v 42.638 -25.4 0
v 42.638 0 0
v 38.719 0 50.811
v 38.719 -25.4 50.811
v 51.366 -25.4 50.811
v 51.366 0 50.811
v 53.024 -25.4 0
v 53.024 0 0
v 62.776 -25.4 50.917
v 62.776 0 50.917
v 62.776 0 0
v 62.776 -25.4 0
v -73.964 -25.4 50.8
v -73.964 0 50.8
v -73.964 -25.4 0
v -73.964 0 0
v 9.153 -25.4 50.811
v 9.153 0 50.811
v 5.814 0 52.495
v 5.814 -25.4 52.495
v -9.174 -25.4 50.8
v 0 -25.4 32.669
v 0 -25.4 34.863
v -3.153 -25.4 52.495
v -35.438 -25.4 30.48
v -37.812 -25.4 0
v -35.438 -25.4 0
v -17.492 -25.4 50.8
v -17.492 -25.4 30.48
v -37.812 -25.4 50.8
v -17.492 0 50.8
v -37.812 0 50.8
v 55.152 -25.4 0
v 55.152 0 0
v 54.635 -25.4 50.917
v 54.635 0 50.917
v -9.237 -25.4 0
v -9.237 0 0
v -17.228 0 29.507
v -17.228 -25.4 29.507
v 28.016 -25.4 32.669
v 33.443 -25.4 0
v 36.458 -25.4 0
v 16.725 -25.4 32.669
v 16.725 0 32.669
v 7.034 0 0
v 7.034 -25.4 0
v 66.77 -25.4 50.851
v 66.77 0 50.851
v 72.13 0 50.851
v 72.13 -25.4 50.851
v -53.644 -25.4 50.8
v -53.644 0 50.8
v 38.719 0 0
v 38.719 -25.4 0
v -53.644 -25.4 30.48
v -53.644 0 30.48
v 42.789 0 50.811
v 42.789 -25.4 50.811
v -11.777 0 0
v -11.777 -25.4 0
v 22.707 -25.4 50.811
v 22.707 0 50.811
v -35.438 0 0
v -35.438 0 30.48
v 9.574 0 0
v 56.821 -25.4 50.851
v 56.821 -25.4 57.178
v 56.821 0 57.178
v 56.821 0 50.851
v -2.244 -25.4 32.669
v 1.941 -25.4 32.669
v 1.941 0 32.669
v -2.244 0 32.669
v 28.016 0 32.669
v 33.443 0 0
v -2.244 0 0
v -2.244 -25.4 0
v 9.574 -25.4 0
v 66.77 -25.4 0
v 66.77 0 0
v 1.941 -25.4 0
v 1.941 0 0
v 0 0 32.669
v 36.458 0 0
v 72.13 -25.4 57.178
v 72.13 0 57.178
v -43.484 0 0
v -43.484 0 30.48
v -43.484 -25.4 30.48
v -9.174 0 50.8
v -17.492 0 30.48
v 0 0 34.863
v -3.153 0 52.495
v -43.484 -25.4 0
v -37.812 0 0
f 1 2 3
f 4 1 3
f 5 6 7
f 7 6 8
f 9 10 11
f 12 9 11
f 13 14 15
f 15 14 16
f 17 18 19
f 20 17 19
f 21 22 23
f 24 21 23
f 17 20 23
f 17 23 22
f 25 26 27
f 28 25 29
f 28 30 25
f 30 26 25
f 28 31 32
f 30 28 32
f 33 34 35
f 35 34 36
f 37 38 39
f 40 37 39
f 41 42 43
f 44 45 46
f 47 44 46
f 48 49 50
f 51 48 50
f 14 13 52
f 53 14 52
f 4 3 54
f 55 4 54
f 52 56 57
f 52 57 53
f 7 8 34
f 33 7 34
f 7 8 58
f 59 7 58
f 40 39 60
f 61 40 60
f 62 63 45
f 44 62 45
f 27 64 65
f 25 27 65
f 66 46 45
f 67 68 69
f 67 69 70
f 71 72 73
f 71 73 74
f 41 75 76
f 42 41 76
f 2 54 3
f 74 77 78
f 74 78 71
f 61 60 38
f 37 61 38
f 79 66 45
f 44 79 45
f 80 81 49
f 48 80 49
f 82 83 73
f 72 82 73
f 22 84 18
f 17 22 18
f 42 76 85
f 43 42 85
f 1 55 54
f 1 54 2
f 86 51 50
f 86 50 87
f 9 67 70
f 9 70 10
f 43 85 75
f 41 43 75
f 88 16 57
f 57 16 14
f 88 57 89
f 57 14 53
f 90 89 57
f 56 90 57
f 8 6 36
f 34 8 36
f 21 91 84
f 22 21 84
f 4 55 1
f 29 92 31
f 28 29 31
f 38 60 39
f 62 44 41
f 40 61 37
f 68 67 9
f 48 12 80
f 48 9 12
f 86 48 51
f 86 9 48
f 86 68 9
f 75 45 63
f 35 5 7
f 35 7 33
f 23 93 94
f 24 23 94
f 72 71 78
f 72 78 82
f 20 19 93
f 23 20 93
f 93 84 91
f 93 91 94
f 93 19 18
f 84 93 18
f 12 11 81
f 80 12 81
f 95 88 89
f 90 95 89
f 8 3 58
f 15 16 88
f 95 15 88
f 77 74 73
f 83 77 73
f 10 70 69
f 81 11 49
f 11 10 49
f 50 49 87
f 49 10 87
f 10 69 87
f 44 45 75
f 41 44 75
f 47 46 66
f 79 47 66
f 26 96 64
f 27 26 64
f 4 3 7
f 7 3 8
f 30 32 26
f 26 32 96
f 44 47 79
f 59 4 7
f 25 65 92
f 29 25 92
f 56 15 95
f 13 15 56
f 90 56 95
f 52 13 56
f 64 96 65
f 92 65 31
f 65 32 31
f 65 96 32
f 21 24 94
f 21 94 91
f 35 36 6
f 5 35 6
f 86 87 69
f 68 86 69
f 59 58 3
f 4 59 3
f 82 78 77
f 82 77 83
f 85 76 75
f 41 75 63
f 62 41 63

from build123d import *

# Parameters (mm, degrees)
F0_W     = 20.32
F0_H     = 20.32
F1_DEPTH = 25.4
F0_W_2   = 2.3739616048
F0_H_2   = 30.48
F0_W_3   = 1.9410408568
F0_H_3   = 32.6687979088
F0_W_4   = 2.2444559727


with BuildPart() as f1:
    # F0 (on Front) → F1 (new body)
    with BuildSketch(Plane.XZ):
        Polygon((-73.9635265827, 30.48), (-73.9635265827, 0), (-43.4835265827, 0), (-43.4835265827, 30.48), (-53.6435265827, 30.48), align=None)
        with Locations((-63.8035265827, 40.64)):
            Rectangle(F0_W, F0_H)
    extrude(amount=F1_DEPTH)


with BuildPart() as f1b:
    # F0 (on Front) → F1, piece 2 (new body)
    with BuildSketch(Plane.XZ):
        Polygon((-17.4919143319, 50.8), (-37.8119143319, 50.8), (-37.8119143319, 30.48), (-35.4379527271, 30.48), (-17.4919143319, 30.48), align=None)
        with Locations((-36.6249335295, 15.24)):
            Rectangle(F0_W_2, F0_H_2)
    extrude(amount=F1_DEPTH)


with BuildPart() as f1c:
    # F0 (on Front) → F1, piece 3 (new body)
    with BuildSketch(Plane.XZ):
        Polygon((-9.2367352918, 0), (-17.2283914096, 29.5070133898), (-11.7767352918, 0), align=None)
    extrude(amount=F1_DEPTH)


with BuildPart() as f1d:
    # F0 (on Front) → F1, piece 4 (new body)
    with BuildSketch(Plane.XZ):
        Polygon((-3.1525824126, 52.4952739344), (-9.1739800919, 50.8), (0, 32.6687979088), (9.153141818, 50.8105286658), (5.8139392069, 52.4952739344), (0, 34.8632640513), align=None)
    extrude(amount=F1_DEPTH)


with BuildPart() as f1e:
    # F0 (on Front) → F1, piece 5 (new body)
    with BuildSketch(Plane.XZ):
        with Locations((0.9705204284, 16.3343989544)):
            Rectangle(F0_W_3, F0_H_3)
        with Locations((-1.1222279863, 16.3343989544)):
            Rectangle(F0_W_4, F0_H_3)
    extrude(amount=F1_DEPTH)


with BuildPart() as f1f:
    # F0 (on Front) → F1, piece 6 (new body)
    with BuildSketch(Plane.XZ):
        Polygon((28.0164722353, 32.6687979088), (22.7072164416, 50.8105286658), (16.7252030224, 32.6687979088), align=None)
    extrude(amount=F1_DEPTH)


with BuildPart() as f1g:
    # F0 (on Front) → F1, piece 7 (new body)
    with BuildSketch(Plane.XZ):
        Polygon((36.4577621222, 0), (28.0164722353, 32.6687979088), (33.4430150688, 0), align=None)
    extrude(amount=F1_DEPTH)


with BuildPart() as f1h:
    # F0 (on Front) → F1, piece 8 (new body)
    with BuildSketch(Plane.XZ):
        Polygon((9.5743408734, 0), (16.7252030224, 32.6687979088), (7.0343408734, 0), align=None)
    extrude(amount=F1_DEPTH)


with BuildPart() as f1i:
    # F0 (on Front) → F1, piece 9 (new body)
    with BuildSketch(Plane.XZ):
        Polygon((51.3659927748, 50.8105286658), (53.0241008602, 0), (55.1524981856, 0), (54.6348481797, 50.9172017455), align=None)
    extrude(amount=F1_DEPTH)


with BuildPart() as f1j:
    # F0 (on Front) → F1, piece 10 (new body)
    with BuildSketch(Plane.XZ):
        Polygon((42.7887253463, 50.8105286658), (38.7188233435, 50.8105286658), (53.0241008602, 0), align=None)
    extrude(amount=F1_DEPTH)


with BuildPart() as f1k:
    # F0 (on Front) → F1, piece 11 (new body)
    with BuildSketch(Plane.XZ):
        Polygon((38.7188233435, 50.8105286658), (38.7188233435, 0), (42.6379851997, 0), align=None)
    extrude(amount=F1_DEPTH)


with BuildPart() as f1l:
    # F0 (on Front) → F1, piece 12 (new body)
    with BuildSketch(Plane.XZ):
        Polygon((66.7702928185, 50.8512742817), (62.7757534385, 50.9172017455), (62.7757534385, 0), (66.7702928185, 0), align=None)
        Polygon((56.8207241595, 50.8512742817), (62.7757534385, 50.9172017455), (66.7702928185, 50.8512742817), (72.1299722791, 50.8512742817), (72.1299722791, 57.1780651808), (56.8207241595, 57.1780651808), align=None)
    extrude(amount=F1_DEPTH)


solid = Compound([f1.part, f1b.part, f1c.part, f1d.part, f1e.part, f1f.part, f1g.part, f1h.part, f1i.part, f1j.part, f1k.part, f1l.part])
